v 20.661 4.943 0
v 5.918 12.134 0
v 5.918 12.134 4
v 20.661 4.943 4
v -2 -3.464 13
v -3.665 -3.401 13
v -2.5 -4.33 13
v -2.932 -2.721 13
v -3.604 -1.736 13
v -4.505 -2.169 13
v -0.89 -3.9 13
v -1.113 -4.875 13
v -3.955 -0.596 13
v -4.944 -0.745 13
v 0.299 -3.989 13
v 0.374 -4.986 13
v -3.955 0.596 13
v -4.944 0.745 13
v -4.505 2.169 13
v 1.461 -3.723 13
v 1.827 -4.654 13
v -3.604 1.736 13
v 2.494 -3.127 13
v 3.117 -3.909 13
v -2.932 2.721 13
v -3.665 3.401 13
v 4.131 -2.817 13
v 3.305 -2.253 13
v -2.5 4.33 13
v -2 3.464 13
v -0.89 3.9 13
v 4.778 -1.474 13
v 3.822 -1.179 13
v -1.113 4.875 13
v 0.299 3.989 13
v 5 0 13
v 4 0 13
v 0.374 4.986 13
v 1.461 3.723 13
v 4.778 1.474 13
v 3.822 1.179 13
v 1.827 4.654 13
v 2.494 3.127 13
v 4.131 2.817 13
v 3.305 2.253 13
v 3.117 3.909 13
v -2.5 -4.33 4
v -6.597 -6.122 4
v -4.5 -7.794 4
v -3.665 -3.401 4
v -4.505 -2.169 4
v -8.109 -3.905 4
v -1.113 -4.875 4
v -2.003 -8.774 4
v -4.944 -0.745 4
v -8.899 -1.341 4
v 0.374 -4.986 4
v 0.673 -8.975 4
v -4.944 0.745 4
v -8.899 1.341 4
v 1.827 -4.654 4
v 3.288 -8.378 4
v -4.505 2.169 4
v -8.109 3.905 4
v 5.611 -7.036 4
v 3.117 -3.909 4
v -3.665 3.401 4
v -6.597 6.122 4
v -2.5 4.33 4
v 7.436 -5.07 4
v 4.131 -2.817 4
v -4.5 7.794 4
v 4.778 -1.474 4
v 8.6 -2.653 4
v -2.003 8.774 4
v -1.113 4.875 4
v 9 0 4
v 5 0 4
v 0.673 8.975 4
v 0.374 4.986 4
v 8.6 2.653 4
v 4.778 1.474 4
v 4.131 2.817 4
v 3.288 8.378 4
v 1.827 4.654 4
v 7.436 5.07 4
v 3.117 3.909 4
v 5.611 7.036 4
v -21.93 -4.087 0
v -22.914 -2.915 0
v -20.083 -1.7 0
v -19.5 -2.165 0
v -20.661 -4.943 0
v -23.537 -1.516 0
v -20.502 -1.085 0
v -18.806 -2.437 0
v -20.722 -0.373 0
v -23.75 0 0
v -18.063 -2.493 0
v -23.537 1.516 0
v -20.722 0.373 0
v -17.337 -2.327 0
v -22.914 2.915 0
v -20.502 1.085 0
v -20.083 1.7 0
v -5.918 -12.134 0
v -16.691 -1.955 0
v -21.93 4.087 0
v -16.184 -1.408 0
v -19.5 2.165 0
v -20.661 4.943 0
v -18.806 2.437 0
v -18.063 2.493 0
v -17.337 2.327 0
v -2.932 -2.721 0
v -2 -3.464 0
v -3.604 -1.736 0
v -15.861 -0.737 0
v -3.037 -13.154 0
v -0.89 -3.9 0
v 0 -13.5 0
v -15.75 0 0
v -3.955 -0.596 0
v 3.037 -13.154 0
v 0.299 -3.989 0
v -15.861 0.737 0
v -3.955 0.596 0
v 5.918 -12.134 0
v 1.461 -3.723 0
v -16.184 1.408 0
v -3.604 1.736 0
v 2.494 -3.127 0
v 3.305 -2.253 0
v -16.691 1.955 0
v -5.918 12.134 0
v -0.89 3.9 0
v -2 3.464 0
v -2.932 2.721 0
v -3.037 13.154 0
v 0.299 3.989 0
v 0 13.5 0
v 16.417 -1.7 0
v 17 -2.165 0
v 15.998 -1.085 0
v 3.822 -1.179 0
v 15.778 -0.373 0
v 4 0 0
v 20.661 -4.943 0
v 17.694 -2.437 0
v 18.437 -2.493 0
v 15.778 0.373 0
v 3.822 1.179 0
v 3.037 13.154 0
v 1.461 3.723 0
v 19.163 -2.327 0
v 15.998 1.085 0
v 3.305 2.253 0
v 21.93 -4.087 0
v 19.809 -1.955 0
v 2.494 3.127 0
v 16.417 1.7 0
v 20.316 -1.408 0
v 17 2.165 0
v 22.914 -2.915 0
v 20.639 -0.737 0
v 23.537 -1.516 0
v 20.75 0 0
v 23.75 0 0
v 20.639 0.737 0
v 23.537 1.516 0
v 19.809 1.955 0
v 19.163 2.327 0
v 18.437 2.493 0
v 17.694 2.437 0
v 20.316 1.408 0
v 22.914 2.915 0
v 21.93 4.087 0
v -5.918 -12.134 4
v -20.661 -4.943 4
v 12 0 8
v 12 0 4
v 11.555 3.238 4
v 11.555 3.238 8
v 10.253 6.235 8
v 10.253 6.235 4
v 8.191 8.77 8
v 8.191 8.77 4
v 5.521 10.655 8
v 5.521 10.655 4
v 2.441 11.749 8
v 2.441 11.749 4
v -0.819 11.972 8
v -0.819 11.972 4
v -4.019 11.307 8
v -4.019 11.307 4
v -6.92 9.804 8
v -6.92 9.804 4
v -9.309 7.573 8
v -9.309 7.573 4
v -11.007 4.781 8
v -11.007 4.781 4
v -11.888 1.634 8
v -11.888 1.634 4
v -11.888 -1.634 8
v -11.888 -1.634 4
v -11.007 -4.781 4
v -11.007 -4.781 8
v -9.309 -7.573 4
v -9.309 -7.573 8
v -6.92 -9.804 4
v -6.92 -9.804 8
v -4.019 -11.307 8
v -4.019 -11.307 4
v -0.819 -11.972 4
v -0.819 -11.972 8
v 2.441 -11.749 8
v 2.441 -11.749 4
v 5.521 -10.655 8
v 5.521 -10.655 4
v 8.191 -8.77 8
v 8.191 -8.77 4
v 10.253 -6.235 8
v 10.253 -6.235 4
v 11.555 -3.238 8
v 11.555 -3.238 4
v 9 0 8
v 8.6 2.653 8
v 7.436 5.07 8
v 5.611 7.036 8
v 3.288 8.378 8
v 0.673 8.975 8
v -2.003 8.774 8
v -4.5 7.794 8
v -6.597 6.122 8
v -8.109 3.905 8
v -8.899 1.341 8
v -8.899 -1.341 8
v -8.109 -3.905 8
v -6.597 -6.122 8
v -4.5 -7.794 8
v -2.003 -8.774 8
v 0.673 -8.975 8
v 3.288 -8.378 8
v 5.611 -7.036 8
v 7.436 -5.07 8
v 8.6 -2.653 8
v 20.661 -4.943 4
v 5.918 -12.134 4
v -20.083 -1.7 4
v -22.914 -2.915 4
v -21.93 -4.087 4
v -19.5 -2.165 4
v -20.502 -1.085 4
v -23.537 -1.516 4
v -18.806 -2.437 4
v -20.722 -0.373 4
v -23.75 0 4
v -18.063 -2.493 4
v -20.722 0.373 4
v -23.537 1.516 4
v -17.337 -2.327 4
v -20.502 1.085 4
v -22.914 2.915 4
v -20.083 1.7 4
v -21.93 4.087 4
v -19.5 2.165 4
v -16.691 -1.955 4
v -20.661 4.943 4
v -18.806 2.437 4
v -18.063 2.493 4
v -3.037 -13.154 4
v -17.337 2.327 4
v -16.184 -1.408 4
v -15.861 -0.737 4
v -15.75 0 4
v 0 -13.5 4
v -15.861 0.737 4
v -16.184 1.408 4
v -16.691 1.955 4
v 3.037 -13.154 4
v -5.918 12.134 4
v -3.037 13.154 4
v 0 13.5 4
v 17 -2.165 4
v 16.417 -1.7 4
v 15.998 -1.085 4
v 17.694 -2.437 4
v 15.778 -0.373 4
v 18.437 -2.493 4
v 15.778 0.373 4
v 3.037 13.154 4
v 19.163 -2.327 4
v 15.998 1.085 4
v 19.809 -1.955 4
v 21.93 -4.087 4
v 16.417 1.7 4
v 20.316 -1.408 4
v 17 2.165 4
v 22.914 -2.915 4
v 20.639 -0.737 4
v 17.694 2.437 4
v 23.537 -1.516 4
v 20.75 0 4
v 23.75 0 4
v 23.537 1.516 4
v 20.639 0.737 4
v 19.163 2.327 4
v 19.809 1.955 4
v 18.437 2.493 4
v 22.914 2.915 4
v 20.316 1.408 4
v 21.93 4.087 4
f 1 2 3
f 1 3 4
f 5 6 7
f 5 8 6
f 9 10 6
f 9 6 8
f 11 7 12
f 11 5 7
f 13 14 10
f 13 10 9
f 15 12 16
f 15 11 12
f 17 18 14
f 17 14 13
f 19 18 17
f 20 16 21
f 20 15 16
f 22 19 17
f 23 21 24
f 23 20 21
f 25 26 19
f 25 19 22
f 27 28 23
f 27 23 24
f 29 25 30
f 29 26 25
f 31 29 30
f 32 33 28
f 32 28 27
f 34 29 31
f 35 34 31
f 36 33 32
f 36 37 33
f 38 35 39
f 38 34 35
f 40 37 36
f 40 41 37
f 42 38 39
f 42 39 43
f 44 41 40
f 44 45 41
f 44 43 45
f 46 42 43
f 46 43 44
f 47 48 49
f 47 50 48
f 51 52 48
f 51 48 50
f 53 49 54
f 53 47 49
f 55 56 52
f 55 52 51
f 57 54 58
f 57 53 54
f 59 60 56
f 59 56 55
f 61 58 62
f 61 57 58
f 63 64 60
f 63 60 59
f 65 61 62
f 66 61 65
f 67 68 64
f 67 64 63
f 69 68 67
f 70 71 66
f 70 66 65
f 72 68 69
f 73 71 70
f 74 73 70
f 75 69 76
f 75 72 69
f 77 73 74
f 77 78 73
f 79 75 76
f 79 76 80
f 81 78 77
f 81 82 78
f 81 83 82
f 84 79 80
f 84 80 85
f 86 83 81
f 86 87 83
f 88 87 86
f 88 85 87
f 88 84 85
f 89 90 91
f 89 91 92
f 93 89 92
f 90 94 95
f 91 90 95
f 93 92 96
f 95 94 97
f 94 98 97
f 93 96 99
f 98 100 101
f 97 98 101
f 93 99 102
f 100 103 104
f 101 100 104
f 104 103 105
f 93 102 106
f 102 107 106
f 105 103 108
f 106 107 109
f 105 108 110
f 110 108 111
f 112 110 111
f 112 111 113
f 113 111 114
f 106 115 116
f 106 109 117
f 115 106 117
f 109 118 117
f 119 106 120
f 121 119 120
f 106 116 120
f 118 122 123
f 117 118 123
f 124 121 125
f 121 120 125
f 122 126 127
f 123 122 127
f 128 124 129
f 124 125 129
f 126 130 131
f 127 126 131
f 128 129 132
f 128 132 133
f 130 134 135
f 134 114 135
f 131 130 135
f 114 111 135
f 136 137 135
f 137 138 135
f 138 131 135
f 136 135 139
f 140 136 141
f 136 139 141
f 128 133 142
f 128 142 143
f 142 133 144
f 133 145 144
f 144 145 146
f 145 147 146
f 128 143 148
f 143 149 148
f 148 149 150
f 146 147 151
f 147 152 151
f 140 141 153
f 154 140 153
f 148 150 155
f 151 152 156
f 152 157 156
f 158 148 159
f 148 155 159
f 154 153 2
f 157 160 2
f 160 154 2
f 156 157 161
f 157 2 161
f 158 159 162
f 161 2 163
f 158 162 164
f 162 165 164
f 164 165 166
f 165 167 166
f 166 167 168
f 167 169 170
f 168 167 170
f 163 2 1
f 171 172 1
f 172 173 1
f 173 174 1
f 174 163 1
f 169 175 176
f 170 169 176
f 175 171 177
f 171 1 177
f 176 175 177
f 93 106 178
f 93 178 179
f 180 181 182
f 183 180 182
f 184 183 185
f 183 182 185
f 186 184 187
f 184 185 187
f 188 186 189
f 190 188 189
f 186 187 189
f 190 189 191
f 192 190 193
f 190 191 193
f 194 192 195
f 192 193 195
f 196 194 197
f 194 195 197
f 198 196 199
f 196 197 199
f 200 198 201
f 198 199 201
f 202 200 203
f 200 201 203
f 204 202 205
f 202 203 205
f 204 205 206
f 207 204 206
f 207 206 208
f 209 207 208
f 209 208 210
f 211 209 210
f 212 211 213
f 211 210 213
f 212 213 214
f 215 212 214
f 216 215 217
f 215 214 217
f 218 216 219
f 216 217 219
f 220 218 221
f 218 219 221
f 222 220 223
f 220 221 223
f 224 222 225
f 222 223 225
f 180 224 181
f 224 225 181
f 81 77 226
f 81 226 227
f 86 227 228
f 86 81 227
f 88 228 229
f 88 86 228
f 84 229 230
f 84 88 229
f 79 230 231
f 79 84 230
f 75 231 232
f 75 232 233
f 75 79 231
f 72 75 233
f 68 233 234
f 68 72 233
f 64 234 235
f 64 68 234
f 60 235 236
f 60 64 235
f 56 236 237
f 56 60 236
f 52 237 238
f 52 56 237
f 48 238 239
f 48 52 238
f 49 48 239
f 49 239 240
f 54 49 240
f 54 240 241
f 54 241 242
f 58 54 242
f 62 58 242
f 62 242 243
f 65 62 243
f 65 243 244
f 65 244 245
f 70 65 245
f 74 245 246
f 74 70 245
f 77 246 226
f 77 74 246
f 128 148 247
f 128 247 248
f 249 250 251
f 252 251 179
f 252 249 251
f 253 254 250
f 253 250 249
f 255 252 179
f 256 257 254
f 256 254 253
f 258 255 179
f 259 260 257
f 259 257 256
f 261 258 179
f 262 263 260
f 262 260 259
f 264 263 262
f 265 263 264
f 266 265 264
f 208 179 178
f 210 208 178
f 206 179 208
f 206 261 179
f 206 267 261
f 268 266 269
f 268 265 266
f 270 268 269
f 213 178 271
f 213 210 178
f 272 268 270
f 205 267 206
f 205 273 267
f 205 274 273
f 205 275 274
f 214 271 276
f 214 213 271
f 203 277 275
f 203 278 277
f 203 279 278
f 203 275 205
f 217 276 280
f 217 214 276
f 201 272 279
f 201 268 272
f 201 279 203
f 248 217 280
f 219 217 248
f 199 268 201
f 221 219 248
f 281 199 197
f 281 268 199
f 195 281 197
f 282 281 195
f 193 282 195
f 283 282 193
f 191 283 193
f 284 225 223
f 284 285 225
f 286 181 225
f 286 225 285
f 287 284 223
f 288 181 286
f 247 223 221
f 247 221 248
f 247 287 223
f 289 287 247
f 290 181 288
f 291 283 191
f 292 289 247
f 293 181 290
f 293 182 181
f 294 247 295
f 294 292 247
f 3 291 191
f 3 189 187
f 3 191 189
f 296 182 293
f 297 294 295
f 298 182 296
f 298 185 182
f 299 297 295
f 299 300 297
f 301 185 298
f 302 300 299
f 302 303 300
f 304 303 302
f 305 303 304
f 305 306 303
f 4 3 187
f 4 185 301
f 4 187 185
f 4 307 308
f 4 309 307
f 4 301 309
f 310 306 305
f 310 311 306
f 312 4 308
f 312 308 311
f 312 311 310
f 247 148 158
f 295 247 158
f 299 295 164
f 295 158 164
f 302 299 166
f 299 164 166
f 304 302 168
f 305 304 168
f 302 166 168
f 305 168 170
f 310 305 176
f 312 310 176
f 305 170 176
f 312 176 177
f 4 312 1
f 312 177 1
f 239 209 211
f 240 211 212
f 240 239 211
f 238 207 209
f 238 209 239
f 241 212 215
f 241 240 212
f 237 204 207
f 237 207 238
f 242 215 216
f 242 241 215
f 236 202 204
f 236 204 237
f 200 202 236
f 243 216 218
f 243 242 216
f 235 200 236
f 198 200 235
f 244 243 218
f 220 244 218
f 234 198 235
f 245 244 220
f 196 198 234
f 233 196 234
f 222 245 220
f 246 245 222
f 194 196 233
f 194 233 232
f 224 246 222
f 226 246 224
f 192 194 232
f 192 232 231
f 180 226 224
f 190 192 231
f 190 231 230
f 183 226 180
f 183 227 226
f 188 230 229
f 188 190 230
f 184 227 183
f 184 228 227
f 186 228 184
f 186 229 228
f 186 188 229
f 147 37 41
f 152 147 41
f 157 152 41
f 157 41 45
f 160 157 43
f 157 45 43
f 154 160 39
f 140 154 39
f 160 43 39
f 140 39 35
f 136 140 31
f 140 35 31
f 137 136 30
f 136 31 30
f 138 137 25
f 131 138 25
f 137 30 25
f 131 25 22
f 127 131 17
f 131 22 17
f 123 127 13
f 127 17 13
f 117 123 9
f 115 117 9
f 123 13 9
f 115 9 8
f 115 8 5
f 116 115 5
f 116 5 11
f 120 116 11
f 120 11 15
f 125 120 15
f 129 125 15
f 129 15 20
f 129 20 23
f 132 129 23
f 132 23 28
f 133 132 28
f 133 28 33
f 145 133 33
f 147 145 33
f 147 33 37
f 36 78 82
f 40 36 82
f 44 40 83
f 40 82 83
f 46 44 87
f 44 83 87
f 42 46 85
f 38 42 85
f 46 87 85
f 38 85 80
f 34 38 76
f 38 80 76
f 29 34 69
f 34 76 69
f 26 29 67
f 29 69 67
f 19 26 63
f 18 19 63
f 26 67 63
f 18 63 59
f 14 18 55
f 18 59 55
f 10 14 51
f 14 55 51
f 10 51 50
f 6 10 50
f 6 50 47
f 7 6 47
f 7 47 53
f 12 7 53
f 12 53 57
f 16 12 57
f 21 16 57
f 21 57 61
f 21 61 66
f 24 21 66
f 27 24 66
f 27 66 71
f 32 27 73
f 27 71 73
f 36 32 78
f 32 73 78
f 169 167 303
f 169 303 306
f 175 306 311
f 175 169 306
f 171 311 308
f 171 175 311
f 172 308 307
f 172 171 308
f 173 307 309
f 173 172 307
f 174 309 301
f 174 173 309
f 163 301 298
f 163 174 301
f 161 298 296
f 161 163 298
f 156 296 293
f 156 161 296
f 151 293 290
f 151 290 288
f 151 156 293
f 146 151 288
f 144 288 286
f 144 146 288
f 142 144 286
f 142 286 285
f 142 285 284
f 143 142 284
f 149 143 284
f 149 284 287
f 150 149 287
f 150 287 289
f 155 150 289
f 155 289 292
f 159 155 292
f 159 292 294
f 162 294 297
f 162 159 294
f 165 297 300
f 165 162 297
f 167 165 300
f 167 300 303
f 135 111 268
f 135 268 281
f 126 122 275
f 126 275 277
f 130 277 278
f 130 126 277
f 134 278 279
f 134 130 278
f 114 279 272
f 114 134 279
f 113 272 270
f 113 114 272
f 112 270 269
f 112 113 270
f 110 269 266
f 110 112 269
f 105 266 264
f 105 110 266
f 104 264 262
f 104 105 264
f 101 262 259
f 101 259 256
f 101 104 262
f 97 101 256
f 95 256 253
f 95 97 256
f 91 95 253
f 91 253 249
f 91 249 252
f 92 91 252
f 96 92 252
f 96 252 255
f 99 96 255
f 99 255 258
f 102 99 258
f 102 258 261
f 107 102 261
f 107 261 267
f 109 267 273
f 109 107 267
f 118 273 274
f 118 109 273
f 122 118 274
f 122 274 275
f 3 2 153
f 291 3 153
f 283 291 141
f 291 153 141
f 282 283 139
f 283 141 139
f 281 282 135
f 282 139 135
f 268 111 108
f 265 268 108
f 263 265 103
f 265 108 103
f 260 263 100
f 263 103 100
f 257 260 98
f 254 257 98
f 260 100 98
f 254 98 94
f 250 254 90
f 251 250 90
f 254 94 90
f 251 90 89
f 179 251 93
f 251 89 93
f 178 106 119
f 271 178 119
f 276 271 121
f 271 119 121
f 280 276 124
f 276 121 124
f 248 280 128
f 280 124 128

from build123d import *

# Parameters (mm, degrees)
SKETCH_R      = 2.5
PAD_DEPTH     = 4
SKETCH001_R   = 5
PAD001_DEPTH  = 9
SKETCH002_R   = 4
POCKET_DEPTH  = 13.001
SKETCH003_R   = 12
SKETCH003_R_2 = 9
PAD002_DEPTH  = 4


with BuildPart() as part:
    # Sketch → Pad (new body)
    with BuildSketch(Plane.XY):
        with BuildLine():
            ThreePointArc((-20.660959, 4.943407), (-23.75, 0), (-20.660959, -4.943407))
            Line((-5.917808, -12.133818), (-20.660959, -4.943407))
            ThreePointArc((-5.917808, -12.133818), (0, -13.5), (5.917808, -12.133818))
            Line((20.660959, -4.943407), (5.917808, -12.133818))
            ThreePointArc((20.660959, -4.943407), (23.75, 0), (20.660959, 4.943407))
            Line((5.917808, 12.133818), (20.660959, 4.943407))
            ThreePointArc((5.917808, 12.133818), (0, 13.5), (-5.917808, 12.133818))
            Line((-20.660959, 4.943407), (-5.917808, 12.133818))
        make_face()
        with Locations((-18.25, 0)):
            Circle(SKETCH_R, mode=Mode.SUBTRACT)
        with Locations((18.25, 0)):
            Circle(SKETCH_R, mode=Mode.SUBTRACT)
    extrude(amount=PAD_DEPTH)

    # Sketch001 (on Face12 of Pad) → Pad001 (join)
    with BuildSketch(Plane.XY.offset(4)):
        Circle(SKETCH001_R)
    extrude(amount=PAD001_DEPTH)

    # Sketch002 (on Face14 of Pad001) → Pocket (cut, through all)
    with BuildSketch(Plane.XY.offset(13)):
        Circle(SKETCH002_R)
    extrude(amount=-POCKET_DEPTH, mode=Mode.SUBTRACT)

    # Sketch003 (on Face5 of Pocket) → Pad002 (join)
    with BuildSketch(Plane.XY.offset(4)):
        Circle(SKETCH003_R)
        Circle(SKETCH003_R_2, mode=Mode.SUBTRACT)
    extrude(amount=PAD002_DEPTH)


solid = part.part
